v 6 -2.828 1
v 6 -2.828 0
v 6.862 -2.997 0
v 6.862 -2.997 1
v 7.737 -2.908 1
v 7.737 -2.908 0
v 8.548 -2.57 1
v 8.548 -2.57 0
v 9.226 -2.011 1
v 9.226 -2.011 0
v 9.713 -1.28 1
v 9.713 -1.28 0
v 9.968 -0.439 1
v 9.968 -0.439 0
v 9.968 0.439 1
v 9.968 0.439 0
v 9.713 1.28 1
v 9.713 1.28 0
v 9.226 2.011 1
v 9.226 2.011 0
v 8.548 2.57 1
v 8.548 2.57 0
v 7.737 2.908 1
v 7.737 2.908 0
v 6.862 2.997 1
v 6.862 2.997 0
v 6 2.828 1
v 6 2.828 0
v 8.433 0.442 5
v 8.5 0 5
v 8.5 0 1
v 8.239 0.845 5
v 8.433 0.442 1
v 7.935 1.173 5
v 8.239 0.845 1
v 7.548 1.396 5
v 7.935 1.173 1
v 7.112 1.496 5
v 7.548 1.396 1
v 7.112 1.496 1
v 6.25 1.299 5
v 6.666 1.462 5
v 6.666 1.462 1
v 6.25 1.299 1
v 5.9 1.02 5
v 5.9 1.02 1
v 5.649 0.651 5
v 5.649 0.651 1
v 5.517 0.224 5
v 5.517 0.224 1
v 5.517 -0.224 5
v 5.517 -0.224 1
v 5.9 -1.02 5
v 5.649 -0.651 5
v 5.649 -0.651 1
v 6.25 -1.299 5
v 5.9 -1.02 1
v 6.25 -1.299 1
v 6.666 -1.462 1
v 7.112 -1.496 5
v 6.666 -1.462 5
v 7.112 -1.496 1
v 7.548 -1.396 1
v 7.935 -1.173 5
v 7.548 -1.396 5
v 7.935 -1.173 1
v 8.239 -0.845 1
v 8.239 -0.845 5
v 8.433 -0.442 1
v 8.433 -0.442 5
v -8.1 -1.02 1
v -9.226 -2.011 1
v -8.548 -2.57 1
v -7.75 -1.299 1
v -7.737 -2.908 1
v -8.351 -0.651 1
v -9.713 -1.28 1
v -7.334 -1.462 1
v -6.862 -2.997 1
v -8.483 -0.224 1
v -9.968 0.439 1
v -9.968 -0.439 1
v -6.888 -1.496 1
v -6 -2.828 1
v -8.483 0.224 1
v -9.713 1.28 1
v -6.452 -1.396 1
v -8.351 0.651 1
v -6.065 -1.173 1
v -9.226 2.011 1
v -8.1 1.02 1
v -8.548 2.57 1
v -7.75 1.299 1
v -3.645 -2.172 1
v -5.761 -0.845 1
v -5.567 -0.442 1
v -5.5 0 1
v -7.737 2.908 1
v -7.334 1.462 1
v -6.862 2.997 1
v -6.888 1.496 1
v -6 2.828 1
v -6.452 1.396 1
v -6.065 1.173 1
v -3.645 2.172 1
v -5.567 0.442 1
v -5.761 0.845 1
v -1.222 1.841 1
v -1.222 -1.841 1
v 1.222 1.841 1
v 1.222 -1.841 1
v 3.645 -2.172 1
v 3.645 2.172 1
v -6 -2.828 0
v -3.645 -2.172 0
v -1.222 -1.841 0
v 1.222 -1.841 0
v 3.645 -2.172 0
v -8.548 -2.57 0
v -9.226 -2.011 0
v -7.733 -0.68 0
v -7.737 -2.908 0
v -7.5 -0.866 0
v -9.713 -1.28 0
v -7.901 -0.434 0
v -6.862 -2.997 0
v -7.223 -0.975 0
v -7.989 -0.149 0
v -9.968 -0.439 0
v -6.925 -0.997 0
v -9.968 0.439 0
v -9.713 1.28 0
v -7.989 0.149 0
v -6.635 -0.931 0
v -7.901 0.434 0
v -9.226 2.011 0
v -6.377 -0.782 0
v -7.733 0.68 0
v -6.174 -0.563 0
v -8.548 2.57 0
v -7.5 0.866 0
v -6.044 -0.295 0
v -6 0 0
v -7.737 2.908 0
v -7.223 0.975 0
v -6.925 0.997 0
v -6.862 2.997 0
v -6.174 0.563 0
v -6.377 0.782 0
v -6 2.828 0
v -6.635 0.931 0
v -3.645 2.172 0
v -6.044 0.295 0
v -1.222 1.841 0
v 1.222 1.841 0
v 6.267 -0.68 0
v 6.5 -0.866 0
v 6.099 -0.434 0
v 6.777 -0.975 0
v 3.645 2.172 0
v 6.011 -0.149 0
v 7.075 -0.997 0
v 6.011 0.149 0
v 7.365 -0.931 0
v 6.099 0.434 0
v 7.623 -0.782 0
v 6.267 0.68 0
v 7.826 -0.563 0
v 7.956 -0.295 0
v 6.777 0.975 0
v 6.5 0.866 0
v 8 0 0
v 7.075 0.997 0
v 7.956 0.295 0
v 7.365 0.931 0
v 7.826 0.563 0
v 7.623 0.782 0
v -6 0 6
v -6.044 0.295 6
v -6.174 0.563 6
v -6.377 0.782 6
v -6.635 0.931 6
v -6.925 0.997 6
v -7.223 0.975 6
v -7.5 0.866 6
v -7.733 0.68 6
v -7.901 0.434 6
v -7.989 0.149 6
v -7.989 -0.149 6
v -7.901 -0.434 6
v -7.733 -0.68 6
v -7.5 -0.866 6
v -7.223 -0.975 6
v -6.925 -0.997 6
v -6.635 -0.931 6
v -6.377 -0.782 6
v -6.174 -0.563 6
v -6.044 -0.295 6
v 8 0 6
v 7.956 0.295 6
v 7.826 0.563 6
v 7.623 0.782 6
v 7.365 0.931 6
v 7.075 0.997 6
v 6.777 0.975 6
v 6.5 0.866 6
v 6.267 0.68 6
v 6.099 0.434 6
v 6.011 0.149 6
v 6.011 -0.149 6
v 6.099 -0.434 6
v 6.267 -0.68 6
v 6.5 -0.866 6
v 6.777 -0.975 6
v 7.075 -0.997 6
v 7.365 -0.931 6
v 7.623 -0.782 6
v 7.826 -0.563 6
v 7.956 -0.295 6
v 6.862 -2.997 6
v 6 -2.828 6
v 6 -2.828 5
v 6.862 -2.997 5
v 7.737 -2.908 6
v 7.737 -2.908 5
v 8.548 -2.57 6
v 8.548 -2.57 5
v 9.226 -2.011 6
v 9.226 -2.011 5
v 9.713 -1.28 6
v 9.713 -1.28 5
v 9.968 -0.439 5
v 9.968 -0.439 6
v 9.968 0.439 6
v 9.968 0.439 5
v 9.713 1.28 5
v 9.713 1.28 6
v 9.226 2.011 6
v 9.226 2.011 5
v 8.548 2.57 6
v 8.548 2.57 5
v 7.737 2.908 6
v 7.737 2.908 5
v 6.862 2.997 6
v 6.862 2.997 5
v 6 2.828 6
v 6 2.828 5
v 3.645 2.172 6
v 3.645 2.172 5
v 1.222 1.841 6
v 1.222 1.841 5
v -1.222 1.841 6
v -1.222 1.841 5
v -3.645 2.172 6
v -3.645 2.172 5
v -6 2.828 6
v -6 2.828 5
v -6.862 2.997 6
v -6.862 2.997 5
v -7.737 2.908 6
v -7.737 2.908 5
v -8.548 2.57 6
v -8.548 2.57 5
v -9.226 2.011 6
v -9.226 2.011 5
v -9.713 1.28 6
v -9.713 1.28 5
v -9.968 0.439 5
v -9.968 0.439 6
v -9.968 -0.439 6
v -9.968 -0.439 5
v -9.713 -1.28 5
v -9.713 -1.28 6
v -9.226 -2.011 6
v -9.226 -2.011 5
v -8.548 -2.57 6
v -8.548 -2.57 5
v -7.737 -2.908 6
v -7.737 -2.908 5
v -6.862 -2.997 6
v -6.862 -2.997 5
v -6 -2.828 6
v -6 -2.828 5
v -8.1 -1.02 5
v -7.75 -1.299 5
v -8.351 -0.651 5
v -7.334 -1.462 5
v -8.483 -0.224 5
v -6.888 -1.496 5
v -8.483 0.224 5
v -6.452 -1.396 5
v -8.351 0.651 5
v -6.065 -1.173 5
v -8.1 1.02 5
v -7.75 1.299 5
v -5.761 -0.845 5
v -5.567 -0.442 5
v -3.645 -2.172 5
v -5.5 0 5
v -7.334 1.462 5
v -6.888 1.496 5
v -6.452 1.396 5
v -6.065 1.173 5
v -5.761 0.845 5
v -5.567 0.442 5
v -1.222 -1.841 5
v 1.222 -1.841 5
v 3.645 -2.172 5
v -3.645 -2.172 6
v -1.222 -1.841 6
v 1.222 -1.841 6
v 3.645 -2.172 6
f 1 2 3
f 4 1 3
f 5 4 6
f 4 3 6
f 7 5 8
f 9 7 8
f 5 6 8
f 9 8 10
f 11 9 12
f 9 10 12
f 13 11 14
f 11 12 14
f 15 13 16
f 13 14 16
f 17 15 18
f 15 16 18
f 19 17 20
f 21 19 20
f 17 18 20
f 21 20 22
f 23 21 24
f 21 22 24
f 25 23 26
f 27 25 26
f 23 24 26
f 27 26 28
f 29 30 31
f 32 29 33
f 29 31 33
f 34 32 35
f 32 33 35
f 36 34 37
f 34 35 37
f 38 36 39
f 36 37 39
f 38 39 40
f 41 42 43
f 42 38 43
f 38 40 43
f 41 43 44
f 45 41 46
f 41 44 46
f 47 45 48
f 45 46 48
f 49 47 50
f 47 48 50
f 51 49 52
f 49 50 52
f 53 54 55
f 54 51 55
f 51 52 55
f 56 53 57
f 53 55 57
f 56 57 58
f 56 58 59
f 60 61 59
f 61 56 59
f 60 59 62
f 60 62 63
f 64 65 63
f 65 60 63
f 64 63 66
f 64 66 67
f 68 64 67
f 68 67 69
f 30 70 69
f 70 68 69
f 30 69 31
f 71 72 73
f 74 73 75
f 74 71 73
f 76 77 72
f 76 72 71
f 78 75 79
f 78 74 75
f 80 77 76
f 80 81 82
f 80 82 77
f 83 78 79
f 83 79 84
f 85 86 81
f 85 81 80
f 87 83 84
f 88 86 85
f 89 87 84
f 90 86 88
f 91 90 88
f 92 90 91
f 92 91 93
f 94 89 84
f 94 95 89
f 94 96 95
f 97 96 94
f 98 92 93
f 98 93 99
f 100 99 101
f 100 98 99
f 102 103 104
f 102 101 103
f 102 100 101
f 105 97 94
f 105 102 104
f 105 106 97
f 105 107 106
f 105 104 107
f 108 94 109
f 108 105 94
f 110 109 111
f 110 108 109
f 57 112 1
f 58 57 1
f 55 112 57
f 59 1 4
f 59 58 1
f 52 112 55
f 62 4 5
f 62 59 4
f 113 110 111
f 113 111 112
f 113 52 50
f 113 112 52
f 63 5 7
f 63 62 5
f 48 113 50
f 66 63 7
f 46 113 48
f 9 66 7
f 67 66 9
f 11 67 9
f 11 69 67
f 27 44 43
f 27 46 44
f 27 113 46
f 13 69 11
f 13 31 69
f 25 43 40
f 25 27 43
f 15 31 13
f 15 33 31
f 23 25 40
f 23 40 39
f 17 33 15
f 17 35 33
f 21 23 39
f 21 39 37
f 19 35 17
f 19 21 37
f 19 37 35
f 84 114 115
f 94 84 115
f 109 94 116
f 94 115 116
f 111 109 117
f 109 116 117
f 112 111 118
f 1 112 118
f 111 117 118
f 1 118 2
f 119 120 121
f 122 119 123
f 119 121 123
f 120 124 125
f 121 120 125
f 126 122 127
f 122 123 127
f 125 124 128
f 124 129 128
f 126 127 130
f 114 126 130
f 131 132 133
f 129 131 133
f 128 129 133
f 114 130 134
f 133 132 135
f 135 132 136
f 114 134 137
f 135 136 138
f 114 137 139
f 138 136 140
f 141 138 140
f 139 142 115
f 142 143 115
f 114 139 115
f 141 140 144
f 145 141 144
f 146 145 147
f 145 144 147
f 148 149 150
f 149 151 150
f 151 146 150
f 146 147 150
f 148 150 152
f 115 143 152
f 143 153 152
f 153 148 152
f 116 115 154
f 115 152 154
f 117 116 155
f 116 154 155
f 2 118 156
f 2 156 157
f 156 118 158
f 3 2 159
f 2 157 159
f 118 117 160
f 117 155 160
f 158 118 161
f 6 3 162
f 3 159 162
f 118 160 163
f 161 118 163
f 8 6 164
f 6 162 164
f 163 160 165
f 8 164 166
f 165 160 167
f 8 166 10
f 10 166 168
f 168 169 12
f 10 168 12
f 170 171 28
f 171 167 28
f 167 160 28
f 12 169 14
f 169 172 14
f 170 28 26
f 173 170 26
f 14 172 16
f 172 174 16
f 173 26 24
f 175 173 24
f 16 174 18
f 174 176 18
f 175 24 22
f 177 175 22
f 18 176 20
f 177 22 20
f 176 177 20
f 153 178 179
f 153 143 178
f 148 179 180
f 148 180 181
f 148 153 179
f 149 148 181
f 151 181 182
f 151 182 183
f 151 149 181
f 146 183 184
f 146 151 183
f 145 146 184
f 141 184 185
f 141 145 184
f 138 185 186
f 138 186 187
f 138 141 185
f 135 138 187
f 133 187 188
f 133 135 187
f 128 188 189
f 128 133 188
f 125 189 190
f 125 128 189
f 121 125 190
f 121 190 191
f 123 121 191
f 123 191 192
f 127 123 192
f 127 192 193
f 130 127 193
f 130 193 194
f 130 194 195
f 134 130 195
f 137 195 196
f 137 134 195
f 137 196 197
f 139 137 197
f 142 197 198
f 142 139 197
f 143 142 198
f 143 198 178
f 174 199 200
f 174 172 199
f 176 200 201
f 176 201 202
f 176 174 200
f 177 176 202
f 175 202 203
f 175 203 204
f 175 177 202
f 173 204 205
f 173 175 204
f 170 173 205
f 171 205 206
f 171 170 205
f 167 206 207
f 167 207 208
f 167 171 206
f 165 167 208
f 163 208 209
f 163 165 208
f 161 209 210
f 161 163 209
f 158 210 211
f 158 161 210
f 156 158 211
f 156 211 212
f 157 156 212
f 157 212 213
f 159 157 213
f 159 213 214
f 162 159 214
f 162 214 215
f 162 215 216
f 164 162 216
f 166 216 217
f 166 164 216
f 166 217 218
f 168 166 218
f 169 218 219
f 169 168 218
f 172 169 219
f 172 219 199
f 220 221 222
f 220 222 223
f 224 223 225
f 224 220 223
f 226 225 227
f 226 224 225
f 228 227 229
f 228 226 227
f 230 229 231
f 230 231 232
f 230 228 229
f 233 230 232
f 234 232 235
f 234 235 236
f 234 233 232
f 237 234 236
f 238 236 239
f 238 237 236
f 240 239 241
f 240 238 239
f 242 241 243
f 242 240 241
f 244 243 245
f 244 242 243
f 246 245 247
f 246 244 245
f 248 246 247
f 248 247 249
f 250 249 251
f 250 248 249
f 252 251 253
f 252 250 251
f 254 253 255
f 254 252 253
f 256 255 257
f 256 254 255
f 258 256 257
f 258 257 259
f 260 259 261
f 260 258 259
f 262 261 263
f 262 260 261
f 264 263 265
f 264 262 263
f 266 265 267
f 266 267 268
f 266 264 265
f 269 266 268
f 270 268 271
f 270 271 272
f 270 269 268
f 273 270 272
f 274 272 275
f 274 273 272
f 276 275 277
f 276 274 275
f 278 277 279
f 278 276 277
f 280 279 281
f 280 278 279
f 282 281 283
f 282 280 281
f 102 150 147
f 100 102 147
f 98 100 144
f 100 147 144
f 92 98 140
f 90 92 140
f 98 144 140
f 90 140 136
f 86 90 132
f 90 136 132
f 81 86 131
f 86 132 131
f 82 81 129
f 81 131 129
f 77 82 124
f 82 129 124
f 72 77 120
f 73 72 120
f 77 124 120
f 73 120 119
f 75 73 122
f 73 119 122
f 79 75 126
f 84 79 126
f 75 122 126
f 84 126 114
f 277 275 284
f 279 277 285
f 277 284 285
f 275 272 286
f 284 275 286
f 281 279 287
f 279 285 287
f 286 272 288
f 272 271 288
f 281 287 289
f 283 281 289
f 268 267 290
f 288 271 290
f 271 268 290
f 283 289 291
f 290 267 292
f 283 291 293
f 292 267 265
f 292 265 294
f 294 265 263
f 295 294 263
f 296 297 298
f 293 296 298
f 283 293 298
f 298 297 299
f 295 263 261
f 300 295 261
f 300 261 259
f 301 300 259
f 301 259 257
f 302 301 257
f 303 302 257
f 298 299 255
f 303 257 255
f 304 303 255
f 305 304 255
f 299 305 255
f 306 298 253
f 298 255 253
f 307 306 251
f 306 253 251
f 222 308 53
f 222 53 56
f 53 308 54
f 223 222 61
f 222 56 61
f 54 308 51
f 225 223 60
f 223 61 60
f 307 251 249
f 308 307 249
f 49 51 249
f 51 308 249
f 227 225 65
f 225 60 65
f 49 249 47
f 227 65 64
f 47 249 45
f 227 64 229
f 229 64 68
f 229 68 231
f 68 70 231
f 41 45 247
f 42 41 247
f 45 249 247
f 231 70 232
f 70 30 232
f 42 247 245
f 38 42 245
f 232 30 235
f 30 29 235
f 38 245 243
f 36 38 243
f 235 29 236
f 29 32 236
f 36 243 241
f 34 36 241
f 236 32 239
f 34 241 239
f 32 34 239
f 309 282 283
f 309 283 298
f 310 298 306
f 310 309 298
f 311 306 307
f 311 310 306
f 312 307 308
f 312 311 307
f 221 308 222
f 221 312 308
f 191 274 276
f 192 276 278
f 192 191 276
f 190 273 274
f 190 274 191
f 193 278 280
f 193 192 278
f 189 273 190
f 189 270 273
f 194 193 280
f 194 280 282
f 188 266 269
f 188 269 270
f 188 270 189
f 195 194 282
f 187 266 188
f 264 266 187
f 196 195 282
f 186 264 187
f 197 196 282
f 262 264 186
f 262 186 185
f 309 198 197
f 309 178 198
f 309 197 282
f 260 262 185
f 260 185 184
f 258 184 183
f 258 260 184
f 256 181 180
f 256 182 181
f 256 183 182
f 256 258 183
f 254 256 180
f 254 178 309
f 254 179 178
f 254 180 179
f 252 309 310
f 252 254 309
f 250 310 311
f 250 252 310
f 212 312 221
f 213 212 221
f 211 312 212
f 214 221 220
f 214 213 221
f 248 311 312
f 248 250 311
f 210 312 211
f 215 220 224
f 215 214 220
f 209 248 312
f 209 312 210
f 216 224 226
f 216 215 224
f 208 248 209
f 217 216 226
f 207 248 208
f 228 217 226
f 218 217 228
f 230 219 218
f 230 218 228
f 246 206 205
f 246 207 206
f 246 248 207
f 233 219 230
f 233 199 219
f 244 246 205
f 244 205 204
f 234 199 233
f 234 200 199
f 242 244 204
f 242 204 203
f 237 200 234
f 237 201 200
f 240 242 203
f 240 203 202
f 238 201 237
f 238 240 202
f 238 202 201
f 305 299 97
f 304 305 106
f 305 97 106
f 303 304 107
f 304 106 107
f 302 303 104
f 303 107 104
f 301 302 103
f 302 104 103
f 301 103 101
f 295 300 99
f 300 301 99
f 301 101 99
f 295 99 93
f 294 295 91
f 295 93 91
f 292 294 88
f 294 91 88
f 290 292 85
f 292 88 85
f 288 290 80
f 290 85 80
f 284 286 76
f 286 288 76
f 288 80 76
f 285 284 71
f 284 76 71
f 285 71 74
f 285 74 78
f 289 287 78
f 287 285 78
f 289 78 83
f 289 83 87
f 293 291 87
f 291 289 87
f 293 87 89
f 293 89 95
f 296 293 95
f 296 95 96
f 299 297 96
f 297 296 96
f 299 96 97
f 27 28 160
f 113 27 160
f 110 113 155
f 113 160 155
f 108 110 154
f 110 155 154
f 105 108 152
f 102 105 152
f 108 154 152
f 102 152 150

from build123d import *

# Parameters (mm, degrees)
SKETCH1_R           = 1
BOSS_EXTRUDE1_DEPTH = 1
SKETCH2_R           = 1.5
SKETCH2_R_2         = 1
BOSS_EXTRUDE2_DEPTH = 5


with BuildPart() as part:
    # Sketch1 → Boss-Extrude1 (new body)
    with BuildSketch(Plane.XY):
        with BuildLine():
            ThreePointArc((-6, 2.828427125), (-10, 0), (-6, -2.828427125))
            ThreePointArc((-6, -2.828427125), (0, -1.798989873), (6, -2.828427125))
            ThreePointArc((6, -2.828427125), (10, 0), (6, 2.828427125))
            ThreePointArc((6, 2.828427125), (0, 1.798989873), (-6, 2.828427125))
        make_face()
        with Locations((-7, 0)):
            Circle(SKETCH1_R, mode=Mode.SUBTRACT)
        with Locations((7, 0)):
            Circle(SKETCH1_R, mode=Mode.SUBTRACT)
    boss_extrude1 = extrude(amount=BOSS_EXTRUDE1_DEPTH)

    # Sketch2 → Boss-Extrude2 (add)
    with BuildSketch(Plane.XY.offset(1)):
        with Locations((-7, 0)):
            Circle(SKETCH2_R)
        with Locations((-7, 0)):
            Circle(SKETCH2_R_2, mode=Mode.SUBTRACT)
        with Locations((7, 0)):
            Circle(SKETCH2_R)
        with Locations((7, 0)):
            Circle(SKETCH2_R_2, mode=Mode.SUBTRACT)
    extrude(amount=BOSS_EXTRUDE2_DEPTH)

    # Mirror1: Boss-Extrude1 across plane
    add(boss_extrude1.mirror(Plane.XY.offset(3)))


solid = part.part
